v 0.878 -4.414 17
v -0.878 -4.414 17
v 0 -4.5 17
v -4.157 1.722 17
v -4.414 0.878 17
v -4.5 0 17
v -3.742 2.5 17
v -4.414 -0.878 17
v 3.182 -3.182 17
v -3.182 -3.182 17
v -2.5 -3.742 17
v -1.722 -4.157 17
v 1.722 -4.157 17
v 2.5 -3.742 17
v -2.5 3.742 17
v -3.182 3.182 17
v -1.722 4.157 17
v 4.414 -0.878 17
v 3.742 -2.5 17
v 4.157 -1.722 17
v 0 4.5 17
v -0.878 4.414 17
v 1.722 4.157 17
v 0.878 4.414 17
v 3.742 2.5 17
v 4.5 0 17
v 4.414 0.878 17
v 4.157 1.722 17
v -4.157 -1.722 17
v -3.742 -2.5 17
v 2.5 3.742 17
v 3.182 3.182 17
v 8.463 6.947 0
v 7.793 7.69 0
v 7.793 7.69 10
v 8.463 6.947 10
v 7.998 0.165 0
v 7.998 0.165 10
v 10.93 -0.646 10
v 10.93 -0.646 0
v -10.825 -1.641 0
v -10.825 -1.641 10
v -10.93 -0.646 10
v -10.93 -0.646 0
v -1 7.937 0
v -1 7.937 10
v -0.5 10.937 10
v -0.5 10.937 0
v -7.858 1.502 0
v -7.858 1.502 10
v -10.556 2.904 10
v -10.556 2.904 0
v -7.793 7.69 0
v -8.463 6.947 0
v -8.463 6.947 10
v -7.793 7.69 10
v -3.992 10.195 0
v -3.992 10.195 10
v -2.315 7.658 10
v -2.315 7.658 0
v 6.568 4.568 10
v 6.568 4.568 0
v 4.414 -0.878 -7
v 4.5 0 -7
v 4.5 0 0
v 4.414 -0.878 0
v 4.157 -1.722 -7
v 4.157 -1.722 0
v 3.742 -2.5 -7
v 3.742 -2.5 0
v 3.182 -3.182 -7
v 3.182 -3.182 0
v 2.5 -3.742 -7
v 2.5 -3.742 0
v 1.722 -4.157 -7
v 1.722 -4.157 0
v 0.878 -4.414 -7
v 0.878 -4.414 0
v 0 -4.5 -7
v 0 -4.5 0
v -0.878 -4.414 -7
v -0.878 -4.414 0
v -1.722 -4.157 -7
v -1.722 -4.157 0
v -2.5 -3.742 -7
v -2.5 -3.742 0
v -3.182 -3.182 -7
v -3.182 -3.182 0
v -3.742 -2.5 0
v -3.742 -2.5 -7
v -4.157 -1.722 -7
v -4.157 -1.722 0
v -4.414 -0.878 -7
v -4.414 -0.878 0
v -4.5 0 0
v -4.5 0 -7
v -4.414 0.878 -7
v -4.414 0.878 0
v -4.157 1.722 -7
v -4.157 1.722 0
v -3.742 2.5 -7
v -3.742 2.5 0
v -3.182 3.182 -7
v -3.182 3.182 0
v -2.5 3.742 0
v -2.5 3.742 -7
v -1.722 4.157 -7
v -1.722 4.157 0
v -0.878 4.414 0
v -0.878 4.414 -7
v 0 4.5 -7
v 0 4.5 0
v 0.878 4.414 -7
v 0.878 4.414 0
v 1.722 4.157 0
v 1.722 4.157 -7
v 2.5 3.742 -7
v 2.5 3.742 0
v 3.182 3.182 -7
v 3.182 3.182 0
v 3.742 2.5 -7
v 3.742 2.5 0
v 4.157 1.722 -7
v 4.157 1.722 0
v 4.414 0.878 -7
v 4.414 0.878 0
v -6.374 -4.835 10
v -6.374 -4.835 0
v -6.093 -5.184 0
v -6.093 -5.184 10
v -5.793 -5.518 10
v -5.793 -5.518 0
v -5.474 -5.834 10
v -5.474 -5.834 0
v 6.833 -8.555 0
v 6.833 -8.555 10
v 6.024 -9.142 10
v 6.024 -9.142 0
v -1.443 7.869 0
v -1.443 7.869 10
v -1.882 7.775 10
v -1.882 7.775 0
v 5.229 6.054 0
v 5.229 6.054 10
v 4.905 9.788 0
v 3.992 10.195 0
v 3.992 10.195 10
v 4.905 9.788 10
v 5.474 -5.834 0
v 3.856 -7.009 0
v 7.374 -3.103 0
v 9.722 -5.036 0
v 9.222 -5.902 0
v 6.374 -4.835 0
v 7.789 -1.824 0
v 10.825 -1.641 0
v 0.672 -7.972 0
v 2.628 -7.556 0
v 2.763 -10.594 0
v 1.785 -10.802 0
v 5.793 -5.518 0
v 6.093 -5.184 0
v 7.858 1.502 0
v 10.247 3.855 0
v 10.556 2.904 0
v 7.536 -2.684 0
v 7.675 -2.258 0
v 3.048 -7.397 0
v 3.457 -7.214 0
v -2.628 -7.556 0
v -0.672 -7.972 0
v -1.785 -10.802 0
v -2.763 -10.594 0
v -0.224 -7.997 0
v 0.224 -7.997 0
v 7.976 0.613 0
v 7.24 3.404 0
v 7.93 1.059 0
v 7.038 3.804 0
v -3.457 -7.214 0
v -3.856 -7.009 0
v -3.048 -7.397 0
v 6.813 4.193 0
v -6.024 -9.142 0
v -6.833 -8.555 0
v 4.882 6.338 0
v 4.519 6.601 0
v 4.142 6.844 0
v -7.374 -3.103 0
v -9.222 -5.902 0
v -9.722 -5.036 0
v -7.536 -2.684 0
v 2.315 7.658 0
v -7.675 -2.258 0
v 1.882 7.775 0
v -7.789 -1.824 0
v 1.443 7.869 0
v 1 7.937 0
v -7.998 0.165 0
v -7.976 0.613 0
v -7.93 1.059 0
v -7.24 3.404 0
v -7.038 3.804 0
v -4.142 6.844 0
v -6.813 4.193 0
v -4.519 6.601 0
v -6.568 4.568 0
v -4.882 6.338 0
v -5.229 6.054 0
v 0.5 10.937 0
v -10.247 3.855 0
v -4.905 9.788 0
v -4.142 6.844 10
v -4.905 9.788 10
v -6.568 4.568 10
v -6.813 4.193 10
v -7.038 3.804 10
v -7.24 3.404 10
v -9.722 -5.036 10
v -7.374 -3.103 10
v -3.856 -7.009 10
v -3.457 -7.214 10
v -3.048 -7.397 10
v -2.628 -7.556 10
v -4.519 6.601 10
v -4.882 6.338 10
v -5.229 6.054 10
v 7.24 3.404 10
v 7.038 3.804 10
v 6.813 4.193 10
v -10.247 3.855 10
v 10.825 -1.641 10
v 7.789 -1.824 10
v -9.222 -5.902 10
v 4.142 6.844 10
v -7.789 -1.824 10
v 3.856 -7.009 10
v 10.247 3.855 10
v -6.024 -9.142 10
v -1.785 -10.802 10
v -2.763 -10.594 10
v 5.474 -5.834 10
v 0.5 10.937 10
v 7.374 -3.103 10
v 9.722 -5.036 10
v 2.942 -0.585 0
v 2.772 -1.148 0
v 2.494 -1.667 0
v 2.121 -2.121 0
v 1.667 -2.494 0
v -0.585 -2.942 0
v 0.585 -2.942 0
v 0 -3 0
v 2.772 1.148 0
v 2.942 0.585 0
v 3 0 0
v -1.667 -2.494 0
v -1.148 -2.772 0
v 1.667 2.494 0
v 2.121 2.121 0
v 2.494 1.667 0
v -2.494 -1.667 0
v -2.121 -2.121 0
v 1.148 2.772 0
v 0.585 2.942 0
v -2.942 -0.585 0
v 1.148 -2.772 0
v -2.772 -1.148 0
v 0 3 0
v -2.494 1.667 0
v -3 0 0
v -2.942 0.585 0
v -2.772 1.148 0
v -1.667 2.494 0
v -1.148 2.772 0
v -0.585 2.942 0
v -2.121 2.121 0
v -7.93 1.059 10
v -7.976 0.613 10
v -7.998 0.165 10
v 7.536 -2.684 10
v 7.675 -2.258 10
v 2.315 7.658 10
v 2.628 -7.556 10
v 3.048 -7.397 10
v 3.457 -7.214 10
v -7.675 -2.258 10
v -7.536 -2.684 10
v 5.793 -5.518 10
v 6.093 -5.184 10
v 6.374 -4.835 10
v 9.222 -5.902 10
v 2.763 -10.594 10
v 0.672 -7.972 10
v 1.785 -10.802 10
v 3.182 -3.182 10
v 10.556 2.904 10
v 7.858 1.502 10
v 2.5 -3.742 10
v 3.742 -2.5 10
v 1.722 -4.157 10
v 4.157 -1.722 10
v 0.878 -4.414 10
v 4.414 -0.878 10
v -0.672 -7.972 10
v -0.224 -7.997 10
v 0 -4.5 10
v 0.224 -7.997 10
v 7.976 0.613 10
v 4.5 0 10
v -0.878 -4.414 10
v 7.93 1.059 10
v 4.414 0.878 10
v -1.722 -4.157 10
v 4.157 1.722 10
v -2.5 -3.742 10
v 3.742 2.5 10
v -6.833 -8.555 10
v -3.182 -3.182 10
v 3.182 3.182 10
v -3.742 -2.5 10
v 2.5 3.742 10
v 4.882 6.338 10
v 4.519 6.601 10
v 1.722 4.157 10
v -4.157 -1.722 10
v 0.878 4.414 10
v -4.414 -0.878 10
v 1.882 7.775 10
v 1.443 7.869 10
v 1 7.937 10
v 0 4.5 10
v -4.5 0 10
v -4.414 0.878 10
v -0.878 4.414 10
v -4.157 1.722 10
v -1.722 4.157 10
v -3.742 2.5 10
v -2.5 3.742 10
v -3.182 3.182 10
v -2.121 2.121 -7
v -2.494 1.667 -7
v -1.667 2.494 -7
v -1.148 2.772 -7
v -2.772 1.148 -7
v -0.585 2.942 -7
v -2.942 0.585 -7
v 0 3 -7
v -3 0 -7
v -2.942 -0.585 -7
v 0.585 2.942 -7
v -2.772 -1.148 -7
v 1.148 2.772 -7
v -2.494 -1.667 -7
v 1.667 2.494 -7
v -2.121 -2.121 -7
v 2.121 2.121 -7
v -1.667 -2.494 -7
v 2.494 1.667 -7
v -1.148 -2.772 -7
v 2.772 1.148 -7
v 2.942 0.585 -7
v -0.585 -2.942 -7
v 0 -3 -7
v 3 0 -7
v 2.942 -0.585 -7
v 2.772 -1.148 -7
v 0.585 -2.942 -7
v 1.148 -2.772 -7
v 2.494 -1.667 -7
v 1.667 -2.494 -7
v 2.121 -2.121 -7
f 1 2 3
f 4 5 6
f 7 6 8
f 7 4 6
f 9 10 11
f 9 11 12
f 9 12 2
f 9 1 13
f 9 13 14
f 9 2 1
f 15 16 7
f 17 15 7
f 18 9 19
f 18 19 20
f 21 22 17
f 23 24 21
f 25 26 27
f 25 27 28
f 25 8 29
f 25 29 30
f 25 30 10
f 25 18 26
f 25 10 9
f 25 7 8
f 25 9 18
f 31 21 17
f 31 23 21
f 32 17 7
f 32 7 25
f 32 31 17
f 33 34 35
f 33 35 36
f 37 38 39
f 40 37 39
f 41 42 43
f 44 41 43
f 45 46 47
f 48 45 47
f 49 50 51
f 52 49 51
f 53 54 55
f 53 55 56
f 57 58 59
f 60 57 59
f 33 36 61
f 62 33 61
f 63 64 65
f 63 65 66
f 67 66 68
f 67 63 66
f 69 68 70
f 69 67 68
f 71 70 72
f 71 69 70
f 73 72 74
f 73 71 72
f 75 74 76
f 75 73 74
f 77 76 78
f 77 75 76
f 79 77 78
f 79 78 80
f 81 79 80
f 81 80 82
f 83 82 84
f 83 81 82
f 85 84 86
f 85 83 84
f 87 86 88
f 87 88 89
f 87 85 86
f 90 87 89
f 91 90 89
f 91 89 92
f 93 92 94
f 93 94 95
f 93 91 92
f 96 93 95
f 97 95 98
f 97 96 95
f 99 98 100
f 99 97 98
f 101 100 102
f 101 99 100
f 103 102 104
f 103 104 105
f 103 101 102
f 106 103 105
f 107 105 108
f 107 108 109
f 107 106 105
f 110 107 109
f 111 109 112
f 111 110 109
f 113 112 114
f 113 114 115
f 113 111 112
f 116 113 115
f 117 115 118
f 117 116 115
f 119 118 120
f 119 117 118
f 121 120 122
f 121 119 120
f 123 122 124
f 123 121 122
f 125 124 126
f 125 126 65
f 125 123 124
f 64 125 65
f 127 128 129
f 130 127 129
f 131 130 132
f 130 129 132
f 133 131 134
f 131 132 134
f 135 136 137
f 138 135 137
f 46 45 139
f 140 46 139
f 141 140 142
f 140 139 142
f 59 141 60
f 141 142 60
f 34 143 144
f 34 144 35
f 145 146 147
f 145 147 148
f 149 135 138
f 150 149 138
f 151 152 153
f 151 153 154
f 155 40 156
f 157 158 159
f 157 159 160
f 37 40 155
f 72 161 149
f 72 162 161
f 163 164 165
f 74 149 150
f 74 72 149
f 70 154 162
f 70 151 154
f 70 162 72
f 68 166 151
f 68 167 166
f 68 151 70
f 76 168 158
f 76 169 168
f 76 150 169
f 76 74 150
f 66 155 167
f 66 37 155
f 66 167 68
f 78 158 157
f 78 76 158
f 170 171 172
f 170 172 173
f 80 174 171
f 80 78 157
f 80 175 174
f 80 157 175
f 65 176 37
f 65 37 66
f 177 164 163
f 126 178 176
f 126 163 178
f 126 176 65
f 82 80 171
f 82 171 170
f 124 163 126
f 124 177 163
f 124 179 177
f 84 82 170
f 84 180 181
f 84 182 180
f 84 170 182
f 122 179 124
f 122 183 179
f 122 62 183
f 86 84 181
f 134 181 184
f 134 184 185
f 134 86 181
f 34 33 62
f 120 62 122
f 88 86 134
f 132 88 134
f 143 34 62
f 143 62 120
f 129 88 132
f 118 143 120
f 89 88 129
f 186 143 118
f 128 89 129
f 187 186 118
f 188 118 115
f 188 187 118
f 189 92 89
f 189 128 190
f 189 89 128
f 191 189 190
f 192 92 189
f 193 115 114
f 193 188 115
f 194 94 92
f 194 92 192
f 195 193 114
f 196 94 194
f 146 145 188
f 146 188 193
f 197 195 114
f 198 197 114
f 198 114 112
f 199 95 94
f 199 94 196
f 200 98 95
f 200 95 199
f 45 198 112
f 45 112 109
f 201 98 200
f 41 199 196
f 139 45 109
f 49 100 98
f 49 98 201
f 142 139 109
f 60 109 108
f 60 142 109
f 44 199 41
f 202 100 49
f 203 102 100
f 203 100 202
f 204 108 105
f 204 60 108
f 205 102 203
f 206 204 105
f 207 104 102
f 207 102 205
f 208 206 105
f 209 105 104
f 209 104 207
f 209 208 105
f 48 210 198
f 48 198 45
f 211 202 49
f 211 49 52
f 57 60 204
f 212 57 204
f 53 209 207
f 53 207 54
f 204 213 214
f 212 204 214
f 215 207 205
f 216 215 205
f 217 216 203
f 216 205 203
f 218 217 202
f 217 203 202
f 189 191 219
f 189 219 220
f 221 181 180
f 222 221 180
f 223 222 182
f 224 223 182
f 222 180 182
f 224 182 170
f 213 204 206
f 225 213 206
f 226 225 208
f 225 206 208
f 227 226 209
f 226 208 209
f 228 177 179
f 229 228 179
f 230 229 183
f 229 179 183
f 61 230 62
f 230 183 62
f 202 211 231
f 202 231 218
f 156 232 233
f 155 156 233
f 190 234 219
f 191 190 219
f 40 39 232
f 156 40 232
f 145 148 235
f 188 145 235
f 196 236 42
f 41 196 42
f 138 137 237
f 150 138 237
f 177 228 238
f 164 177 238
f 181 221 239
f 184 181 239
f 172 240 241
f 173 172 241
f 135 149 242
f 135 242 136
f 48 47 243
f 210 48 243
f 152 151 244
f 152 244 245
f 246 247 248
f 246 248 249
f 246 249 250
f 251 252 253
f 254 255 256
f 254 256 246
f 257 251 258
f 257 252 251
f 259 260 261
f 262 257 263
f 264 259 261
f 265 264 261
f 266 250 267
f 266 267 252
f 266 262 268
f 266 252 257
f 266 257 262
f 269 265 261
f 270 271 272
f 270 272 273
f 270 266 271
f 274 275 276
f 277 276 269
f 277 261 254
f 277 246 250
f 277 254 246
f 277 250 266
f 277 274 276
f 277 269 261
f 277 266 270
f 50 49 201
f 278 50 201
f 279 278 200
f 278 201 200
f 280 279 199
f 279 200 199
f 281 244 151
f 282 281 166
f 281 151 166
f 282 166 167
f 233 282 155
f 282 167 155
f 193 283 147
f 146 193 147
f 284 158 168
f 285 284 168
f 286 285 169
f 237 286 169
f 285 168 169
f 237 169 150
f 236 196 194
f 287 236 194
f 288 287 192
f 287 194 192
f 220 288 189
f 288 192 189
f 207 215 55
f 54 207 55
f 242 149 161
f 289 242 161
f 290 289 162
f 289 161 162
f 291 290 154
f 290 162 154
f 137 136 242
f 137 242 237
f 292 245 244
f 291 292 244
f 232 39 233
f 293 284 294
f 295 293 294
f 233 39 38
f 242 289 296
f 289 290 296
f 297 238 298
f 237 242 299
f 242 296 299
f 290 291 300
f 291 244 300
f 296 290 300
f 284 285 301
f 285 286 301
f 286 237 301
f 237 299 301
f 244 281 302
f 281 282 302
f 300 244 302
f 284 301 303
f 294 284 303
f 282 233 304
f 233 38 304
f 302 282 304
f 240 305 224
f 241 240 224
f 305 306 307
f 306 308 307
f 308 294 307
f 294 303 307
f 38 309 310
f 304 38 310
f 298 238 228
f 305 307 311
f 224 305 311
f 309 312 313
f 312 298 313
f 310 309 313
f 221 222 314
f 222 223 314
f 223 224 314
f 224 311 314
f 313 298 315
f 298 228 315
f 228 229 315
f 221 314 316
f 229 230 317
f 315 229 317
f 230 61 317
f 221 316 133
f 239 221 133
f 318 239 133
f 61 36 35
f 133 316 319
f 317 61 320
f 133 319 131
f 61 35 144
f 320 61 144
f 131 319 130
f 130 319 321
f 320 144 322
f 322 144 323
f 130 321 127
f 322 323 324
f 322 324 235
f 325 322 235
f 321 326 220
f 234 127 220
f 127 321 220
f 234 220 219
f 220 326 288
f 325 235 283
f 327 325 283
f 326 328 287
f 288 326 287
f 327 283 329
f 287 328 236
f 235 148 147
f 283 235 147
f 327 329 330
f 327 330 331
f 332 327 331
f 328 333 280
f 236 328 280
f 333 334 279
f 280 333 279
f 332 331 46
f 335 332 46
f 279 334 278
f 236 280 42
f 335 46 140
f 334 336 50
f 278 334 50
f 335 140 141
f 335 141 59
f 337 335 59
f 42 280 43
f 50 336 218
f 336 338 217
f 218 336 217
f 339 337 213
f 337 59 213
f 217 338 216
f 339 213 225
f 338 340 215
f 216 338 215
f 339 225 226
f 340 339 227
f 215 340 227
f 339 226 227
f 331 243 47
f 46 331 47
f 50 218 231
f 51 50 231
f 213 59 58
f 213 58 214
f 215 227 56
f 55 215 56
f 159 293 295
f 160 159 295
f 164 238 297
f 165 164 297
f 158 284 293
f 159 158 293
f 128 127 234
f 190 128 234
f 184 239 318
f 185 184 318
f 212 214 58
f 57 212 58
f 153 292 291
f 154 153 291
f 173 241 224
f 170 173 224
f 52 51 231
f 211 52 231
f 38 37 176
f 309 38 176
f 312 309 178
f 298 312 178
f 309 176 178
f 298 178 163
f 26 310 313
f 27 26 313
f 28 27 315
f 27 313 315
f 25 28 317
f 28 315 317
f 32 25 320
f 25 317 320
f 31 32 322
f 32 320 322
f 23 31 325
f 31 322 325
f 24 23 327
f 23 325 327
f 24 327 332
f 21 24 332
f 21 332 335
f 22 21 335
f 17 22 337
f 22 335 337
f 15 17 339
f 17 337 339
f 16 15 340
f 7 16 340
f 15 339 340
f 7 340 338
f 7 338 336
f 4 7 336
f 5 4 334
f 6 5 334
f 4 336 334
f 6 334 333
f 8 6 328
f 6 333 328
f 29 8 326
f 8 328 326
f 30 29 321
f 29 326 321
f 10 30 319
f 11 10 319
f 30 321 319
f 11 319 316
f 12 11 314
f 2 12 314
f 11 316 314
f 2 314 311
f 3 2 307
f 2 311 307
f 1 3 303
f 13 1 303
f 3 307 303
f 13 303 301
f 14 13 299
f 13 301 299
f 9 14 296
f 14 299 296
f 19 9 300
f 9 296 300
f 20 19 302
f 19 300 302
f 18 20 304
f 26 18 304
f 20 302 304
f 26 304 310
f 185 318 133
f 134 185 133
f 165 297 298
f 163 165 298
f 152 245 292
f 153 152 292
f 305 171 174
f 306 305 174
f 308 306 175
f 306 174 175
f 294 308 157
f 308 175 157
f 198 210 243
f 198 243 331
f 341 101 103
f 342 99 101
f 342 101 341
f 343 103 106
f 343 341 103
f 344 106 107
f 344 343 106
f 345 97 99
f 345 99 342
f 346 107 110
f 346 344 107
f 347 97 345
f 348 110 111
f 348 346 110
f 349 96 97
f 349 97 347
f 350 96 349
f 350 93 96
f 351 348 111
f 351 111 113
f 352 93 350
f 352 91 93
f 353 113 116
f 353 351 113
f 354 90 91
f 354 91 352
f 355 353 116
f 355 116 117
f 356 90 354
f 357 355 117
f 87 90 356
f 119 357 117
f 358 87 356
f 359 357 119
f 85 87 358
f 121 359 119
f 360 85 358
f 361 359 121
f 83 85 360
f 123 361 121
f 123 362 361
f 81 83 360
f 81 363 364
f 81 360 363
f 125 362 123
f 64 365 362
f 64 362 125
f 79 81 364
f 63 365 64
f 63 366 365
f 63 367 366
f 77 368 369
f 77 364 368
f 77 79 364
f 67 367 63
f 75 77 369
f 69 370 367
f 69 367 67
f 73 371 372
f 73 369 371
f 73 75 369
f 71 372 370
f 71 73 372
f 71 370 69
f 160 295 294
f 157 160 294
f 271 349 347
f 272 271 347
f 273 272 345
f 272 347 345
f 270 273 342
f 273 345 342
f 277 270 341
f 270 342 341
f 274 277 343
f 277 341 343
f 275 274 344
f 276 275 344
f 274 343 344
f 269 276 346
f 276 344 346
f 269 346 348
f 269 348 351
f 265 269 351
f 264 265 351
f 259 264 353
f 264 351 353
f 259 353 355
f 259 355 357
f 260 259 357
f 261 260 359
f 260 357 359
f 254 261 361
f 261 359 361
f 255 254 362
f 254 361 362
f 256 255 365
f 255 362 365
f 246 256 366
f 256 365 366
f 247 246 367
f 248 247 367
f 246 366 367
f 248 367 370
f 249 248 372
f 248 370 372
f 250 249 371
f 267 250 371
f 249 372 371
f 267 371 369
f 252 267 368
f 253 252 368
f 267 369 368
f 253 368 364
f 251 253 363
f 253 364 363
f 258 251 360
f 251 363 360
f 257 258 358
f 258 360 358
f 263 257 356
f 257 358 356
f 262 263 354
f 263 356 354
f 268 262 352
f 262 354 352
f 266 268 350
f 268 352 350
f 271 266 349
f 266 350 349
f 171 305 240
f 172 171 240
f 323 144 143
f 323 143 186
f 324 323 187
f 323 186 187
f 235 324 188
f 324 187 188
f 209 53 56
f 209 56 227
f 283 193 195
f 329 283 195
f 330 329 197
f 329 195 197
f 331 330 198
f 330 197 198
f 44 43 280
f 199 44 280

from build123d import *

# Parameters (mm, degrees)
SKETCH1_R           = 8
BOSS_EXTRUDE1_DEPTH = 10
BOSS_EXTRUDE2_DEPTH = 10
SKETCH3_R           = 4.5
BOSS_EXTRUDE3_DEPTH = 7
SKETCH3_2_R         = 4.5
BOSS_EXTRUDE4_DEPTH = 7
BOSS_EXTRUDE5_START = 7
SKETCH4_R           = 4.5
BOSS_EXTRUDE5_DEPTH = 7
SKETCH5_R           = 3
CUT_EXTRUDE9_DEPTH  = 7


with BuildPart() as part:
    # Sketch1 → Boss-Extrude1 (new body)
    with BuildSketch(Plane.XY):
        Circle(SKETCH1_R)
    extrude(amount=BOSS_EXTRUDE1_DEPTH)

    # Sketch2 → Boss-Extrude2 (add)
    with BuildSketch(Plane.XY.offset(10)):
        Polygon((-1, 7.937253933), (-0.5, 10.937253933), (0.5, 10.937253933), (1, 7.937253933), align=None)
        Polygon((2.314826562, 7.65777892), (3.99180922, 10.195046971), (4.905354678, 9.788310328), (4.141917478, 6.844305634), align=None)
        Polygon((5.229398583, 6.054204363), (7.793398362, 7.690023769), (8.462528969, 6.946878943), (6.567659795, 4.567914712), align=None)
        Polygon((7.23976008, 3.40380287), (10.247438126, 3.855325595), (10.556455121, 2.904269079), (7.857794069, 1.501689838), align=None)
        Polygon((7.998301289, 0.164852939), (10.929602743, -0.645993398), (10.82507428, -1.640515294), (7.789244362, -1.824190852), align=None)
        Polygon((7.373863542, -3.102601563), (9.721939754, -5.035614265), (9.221939754, -5.901639668), (6.373863542, -4.83465237), align=None)
        Polygon((5.4744178, -5.833588068), (6.83326506, -8.554531678), (6.024248065, -9.14231693), (3.856383811, -7.009158573), align=None)
        Polygon((2.628395486, -7.5558942), (2.763056759, -10.594292848), (1.784909158, -10.802204539), (0.672100285, -7.971717582), align=None)
        Polygon((-0.672100285, -7.971717582), (-1.784909158, -10.802204539), (-2.763056759, -10.594292848), (-2.628395486, -7.5558942), align=None)
        Polygon((-3.856383811, -7.009158573), (-6.024248065, -9.14231693), (-6.83326506, -8.554531678), (-5.4744178, -5.833588068), align=None)
        Polygon((-6.373863542, -4.83465237), (-9.221939754, -5.901639668), (-9.721939754, -5.035614265), (-7.373863542, -3.102601563), align=None)
        Polygon((-7.789244362, -1.824190852), (-10.82507428, -1.640515294), (-10.929602743, -0.645993398), (-7.998301289, 0.164852939), align=None)
        Polygon((-7.857794069, 1.501689838), (-10.556455121, 2.904269079), (-10.247438126, 3.855325595), (-7.23976008, 3.40380287), align=None)
        Polygon((-6.567659795, 4.567914712), (-8.462528969, 6.946878943), (-7.793398362, 7.690023769), (-5.229398583, 6.054204363), align=None)
        Polygon((-4.141917478, 6.844305634), (-4.905354678, 9.788310328), (-3.99180922, 10.195046971), (-2.314826562, 7.65777892), align=None)
    extrude(amount=-BOSS_EXTRUDE2_DEPTH)

    # Sketch3 → Boss-Extrude3 (add)
    with BuildSketch(Plane.XY.offset(10)):
        Circle(SKETCH3_R)
    extrude(amount=BOSS_EXTRUDE3_DEPTH)

    # Sketch3<2> → Boss-Extrude4 (add)
    with BuildSketch(Plane.XY.offset(10)):
        Circle(SKETCH3_2_R)
    extrude(amount=BOSS_EXTRUDE4_DEPTH)

    # Sketch4 → Boss-Extrude5 (add)
    with BuildSketch(Plane(origin=(0, 0, 0), x_dir=(-1, 0, 0), z_dir=(0, 0, -1)).offset(BOSS_EXTRUDE5_START)):
        with Locations(Location((0, 0, 0), (0, 0, 180))):
            Circle(SKETCH4_R)
    extrude(amount=-BOSS_EXTRUDE5_DEPTH)

    # Sketch5 → Cut-Extrude9 (cut)
    with BuildSketch(Plane(origin=(0, 0, -7), x_dir=(-1, 0, 0), z_dir=(0, 0, -1))):
        Circle(SKETCH5_R)
    extrude(amount=-CUT_EXTRUDE9_DEPTH, mode=Mode.SUBTRACT)


solid = part.part
